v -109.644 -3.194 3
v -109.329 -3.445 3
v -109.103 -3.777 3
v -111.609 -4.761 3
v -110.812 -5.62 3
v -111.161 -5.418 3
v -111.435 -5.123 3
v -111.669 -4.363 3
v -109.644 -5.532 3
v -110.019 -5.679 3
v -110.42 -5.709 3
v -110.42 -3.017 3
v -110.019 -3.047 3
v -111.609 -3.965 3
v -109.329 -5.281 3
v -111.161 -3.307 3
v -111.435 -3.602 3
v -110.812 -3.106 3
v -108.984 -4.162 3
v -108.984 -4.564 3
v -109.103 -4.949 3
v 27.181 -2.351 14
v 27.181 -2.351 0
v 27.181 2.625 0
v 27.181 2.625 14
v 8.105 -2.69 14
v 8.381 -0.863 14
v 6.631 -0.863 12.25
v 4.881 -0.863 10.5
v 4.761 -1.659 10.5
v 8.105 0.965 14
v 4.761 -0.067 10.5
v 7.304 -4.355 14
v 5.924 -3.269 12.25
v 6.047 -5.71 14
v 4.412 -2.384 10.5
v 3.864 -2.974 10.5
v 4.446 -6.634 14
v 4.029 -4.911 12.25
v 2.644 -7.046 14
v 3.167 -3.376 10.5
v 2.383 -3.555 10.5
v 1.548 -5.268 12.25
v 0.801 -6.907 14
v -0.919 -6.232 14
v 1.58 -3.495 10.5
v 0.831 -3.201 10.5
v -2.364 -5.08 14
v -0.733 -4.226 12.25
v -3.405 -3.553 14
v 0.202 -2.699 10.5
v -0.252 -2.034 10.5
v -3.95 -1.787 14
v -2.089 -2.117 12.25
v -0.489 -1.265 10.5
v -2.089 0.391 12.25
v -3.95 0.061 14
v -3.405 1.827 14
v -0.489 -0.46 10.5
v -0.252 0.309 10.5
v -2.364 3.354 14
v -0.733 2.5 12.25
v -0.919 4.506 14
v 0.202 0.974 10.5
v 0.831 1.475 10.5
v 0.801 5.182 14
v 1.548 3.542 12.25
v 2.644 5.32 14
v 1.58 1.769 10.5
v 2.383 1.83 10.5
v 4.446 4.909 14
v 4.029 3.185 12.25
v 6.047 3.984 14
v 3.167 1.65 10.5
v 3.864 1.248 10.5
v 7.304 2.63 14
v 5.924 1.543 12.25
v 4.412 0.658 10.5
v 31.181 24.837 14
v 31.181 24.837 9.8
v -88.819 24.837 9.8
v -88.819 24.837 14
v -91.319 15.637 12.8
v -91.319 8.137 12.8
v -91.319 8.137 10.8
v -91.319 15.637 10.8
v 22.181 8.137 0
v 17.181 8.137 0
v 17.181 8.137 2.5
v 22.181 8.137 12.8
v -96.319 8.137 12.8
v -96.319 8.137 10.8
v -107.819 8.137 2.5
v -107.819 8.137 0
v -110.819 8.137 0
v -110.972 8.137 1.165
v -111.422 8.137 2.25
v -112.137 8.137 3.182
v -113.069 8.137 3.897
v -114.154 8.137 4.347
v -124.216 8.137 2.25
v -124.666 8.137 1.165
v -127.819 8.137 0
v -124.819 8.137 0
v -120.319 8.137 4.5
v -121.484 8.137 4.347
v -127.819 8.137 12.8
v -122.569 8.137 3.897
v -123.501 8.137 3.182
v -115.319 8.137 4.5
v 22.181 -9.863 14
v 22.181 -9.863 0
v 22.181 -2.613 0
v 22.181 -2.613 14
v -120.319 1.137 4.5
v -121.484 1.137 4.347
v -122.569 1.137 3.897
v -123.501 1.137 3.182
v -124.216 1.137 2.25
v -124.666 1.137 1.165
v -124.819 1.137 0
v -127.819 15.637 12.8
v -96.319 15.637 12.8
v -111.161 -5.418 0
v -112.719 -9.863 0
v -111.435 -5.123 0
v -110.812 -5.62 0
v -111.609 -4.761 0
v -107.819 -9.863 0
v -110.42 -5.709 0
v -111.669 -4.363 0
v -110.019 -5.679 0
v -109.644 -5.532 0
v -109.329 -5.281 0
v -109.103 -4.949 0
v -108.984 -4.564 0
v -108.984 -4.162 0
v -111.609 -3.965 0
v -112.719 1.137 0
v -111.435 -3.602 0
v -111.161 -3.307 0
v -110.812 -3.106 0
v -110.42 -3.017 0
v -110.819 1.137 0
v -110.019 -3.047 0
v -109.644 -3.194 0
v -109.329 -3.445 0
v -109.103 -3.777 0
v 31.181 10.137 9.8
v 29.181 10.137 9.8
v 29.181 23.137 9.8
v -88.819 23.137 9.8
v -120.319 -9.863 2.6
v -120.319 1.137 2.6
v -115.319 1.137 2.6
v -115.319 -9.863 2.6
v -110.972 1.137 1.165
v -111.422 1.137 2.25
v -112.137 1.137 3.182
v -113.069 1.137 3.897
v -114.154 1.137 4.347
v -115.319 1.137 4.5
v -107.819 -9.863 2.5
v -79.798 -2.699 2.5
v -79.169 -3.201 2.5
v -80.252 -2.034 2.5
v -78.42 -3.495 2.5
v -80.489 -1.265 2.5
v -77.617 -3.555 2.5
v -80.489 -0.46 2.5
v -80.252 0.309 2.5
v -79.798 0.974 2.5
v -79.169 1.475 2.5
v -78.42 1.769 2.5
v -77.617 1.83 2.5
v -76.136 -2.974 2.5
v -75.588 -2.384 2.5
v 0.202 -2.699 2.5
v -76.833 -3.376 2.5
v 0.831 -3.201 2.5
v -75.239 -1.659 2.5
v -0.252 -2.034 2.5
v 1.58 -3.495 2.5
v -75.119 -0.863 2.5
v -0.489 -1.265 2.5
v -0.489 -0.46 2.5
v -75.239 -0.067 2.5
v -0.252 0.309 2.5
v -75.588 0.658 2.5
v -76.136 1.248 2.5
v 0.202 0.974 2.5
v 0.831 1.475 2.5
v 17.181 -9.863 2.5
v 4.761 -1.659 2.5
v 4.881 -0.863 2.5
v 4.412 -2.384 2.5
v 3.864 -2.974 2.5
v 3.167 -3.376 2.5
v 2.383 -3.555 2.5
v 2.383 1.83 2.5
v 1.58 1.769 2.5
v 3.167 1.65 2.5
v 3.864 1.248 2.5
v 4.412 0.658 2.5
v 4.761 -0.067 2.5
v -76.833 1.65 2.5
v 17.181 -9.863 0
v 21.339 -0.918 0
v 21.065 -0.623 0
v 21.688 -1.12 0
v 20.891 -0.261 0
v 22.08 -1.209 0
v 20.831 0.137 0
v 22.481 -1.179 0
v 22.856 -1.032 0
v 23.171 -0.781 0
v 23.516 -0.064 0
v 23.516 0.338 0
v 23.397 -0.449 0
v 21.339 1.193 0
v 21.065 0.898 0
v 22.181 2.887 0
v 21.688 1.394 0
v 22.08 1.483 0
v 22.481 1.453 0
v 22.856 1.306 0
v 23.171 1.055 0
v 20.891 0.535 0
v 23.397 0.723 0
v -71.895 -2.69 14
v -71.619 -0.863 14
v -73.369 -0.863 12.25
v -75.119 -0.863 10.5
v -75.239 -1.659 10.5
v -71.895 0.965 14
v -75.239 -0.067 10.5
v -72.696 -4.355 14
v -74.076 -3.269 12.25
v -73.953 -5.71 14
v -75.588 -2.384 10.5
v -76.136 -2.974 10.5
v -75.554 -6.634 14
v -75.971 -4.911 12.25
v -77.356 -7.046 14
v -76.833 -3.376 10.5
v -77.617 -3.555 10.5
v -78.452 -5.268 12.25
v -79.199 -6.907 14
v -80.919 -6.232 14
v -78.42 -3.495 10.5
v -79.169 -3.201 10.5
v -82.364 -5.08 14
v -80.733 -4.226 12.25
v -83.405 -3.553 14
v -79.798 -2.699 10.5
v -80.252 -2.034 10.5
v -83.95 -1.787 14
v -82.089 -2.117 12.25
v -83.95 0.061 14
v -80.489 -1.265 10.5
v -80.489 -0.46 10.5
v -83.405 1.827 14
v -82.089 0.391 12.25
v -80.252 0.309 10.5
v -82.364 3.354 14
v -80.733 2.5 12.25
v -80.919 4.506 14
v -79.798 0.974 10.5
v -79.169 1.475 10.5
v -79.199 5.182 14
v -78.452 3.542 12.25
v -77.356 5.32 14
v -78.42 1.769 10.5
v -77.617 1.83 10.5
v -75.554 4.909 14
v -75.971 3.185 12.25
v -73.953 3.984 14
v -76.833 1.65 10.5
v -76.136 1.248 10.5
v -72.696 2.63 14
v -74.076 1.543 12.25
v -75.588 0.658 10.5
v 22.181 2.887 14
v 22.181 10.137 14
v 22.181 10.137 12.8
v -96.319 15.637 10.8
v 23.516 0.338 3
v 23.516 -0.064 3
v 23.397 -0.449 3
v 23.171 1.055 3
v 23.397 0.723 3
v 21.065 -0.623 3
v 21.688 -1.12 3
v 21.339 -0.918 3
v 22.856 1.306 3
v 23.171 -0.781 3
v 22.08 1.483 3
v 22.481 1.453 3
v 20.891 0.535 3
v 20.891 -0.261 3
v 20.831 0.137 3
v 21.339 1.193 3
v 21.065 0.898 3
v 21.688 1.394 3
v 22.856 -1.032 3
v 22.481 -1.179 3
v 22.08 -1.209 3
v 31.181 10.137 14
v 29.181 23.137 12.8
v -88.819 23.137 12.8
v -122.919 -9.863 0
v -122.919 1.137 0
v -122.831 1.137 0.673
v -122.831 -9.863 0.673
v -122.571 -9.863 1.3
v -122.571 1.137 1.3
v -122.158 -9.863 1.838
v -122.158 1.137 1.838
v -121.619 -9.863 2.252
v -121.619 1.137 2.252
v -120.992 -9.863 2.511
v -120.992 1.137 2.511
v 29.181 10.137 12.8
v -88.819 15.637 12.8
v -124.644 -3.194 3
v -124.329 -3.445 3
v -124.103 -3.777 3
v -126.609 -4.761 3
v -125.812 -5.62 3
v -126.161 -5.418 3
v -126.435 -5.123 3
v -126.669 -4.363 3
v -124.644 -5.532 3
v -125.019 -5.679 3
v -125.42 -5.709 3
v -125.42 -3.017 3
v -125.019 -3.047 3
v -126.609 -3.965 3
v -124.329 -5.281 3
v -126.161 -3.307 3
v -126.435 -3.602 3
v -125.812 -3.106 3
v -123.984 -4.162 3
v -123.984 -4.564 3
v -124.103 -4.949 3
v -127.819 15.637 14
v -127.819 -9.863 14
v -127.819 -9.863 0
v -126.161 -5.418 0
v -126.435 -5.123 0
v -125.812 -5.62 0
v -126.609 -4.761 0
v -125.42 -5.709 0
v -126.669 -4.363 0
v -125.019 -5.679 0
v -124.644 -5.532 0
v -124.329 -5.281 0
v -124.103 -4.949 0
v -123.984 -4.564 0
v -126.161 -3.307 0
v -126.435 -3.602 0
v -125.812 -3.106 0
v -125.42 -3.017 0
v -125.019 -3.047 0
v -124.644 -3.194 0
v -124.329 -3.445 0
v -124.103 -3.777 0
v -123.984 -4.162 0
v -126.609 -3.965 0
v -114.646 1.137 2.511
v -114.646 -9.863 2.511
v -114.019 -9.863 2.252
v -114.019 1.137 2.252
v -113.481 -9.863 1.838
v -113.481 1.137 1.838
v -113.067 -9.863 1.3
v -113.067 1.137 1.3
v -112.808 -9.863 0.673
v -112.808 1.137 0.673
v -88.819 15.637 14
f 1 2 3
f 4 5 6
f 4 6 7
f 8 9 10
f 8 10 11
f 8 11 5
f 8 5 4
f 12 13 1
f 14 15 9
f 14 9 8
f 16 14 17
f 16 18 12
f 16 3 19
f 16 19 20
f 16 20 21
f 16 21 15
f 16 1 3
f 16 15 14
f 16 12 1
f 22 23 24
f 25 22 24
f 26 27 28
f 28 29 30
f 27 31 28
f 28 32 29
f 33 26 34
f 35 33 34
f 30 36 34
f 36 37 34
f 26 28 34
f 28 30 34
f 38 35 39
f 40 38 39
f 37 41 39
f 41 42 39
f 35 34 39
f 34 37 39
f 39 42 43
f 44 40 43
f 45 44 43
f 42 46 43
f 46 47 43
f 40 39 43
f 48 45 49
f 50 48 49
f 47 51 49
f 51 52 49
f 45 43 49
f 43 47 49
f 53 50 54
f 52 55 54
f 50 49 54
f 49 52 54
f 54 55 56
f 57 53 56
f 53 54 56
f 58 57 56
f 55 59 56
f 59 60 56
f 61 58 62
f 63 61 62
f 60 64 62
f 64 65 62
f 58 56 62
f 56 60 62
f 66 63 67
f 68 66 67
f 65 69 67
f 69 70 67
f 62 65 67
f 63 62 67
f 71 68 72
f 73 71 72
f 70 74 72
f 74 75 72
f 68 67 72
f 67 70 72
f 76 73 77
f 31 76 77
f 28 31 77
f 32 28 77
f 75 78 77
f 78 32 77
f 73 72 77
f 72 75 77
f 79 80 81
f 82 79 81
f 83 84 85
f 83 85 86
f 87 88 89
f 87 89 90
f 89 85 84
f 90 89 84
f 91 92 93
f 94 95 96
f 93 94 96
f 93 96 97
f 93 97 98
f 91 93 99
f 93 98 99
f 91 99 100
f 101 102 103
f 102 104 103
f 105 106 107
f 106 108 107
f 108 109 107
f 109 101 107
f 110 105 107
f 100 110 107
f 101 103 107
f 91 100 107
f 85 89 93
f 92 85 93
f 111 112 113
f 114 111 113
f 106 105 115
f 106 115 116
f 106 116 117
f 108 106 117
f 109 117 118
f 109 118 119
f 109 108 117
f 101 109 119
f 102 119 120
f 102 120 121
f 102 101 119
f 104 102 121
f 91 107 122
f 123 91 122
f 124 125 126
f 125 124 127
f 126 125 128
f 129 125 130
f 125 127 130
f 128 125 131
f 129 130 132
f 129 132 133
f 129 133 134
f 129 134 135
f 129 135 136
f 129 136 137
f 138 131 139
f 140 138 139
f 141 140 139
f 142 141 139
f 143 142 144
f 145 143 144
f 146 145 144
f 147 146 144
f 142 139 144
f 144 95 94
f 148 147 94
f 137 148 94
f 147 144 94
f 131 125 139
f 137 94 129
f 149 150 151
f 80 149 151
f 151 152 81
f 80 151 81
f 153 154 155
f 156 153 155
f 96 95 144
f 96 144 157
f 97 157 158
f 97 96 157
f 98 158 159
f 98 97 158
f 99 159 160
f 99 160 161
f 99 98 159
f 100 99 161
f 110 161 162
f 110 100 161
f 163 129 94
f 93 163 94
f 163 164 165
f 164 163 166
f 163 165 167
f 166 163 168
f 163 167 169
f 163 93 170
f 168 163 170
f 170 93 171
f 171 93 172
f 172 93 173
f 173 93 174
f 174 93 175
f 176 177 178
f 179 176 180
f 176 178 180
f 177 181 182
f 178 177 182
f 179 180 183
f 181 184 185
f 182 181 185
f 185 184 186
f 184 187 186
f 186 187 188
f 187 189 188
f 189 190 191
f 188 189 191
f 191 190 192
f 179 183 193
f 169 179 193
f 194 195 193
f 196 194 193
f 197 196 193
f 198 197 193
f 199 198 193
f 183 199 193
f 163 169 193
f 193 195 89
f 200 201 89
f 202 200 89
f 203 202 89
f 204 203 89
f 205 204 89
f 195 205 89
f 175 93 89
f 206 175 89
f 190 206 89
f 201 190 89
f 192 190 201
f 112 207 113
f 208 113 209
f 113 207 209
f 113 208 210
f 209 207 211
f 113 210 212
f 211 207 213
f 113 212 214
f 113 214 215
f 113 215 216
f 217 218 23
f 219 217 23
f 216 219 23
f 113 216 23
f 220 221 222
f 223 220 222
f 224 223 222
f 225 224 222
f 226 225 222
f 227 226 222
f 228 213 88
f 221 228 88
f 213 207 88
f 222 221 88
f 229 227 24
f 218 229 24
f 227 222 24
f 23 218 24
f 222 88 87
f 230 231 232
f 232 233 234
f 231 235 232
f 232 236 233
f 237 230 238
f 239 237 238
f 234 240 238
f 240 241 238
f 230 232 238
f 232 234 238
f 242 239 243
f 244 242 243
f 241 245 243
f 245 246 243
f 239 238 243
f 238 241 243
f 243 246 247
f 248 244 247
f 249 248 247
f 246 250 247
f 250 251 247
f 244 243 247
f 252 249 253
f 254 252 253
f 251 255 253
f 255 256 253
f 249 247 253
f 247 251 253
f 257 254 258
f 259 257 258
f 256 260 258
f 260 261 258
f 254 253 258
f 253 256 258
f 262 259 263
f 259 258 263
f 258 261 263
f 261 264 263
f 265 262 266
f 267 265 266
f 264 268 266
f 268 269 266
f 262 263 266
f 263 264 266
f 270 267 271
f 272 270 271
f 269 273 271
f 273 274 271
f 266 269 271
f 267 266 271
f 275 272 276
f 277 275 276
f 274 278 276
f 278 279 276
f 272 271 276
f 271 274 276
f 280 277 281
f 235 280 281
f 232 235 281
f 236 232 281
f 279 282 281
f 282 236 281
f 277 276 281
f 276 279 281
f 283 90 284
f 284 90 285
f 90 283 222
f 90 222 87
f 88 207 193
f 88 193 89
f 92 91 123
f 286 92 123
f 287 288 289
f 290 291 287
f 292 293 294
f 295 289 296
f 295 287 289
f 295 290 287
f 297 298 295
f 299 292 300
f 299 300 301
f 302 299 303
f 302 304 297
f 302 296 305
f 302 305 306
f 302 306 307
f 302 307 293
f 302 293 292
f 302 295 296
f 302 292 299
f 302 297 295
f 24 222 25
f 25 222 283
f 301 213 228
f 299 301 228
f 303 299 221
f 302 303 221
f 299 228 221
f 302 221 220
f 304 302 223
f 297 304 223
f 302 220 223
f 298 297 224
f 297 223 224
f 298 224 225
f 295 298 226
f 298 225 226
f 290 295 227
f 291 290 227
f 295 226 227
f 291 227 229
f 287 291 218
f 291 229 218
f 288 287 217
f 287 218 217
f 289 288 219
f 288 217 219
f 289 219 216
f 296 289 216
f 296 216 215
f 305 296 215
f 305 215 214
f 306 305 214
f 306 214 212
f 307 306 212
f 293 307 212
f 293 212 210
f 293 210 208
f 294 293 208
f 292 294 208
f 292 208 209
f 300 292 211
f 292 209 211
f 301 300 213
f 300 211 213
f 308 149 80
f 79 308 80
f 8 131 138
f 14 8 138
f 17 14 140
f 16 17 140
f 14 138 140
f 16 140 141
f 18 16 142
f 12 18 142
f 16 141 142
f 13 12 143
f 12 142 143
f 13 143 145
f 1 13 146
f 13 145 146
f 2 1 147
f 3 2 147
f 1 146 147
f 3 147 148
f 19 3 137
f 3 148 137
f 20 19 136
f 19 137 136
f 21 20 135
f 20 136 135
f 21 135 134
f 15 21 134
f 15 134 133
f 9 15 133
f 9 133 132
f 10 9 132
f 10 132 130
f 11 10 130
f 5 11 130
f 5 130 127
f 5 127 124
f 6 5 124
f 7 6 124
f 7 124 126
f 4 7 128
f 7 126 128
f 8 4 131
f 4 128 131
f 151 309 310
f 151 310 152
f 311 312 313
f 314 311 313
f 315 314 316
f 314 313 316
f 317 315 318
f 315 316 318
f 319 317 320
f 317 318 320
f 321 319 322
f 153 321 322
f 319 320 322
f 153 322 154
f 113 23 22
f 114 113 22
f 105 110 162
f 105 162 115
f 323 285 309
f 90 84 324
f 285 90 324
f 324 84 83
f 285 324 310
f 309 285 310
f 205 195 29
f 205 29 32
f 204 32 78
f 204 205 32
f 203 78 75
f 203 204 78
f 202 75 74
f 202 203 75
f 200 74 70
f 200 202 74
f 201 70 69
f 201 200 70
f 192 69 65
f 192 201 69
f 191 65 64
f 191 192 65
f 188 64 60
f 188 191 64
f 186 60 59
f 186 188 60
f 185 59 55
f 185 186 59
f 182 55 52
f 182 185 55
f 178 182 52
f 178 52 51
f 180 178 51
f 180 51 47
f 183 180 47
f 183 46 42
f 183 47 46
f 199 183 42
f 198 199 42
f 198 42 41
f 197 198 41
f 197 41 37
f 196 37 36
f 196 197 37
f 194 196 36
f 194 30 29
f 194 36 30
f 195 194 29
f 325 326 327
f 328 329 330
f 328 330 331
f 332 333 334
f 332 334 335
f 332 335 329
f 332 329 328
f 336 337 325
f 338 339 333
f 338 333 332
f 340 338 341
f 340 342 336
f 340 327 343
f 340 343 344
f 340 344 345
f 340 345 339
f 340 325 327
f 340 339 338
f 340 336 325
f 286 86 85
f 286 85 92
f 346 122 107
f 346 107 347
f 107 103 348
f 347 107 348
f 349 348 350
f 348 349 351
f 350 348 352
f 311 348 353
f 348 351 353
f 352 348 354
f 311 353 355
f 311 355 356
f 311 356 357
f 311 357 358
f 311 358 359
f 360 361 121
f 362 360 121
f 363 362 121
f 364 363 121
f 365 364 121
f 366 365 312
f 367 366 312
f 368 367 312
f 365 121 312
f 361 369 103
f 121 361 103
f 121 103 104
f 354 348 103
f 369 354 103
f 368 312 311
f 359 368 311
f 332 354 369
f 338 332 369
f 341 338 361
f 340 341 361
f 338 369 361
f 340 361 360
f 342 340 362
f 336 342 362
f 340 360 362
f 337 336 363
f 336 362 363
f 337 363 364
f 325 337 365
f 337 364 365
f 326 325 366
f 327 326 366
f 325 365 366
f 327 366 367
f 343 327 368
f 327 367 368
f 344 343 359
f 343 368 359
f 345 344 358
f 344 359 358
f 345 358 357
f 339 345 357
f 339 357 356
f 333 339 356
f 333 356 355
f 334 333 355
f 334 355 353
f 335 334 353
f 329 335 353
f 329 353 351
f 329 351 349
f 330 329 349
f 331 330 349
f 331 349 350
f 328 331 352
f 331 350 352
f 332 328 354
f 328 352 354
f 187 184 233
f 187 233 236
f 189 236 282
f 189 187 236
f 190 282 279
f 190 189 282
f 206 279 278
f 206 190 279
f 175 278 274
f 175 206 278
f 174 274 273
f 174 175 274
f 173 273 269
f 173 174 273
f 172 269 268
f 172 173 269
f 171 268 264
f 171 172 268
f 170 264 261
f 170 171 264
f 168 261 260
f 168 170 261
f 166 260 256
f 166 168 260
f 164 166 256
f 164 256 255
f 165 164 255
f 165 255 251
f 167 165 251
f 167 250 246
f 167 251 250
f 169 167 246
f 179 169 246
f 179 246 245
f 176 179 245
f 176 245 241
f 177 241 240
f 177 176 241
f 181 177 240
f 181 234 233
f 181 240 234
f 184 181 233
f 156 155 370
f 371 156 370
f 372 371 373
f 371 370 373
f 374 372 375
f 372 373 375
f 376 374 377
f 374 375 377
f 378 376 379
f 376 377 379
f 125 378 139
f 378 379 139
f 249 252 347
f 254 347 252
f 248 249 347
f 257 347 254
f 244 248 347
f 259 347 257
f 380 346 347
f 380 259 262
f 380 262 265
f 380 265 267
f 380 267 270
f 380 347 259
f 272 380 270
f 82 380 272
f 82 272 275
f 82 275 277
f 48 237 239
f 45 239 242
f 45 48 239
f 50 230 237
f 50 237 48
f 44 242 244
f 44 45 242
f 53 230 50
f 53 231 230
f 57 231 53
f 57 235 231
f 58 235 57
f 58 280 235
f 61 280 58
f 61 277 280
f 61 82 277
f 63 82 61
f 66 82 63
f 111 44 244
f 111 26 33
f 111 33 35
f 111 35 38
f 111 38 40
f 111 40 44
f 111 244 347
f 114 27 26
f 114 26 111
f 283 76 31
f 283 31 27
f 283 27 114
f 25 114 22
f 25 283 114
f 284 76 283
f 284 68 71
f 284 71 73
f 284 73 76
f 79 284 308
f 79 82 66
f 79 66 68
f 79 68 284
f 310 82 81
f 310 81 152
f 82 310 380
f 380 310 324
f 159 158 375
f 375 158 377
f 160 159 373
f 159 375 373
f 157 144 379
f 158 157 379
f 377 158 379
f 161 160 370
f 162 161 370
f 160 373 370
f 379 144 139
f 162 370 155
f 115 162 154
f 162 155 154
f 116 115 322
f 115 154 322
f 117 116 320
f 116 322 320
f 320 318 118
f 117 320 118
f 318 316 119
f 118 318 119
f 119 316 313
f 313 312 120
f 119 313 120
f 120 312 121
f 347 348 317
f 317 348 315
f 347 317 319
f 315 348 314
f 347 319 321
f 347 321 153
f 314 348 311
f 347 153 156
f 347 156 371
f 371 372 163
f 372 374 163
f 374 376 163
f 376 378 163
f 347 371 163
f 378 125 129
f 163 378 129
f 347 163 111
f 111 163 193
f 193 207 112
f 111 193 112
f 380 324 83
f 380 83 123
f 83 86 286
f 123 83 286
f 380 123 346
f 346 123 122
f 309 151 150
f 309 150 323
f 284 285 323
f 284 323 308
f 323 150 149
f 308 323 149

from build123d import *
from OCP.BRepFilletAPI import BRepFilletAPI_MakeChamfer

# Parameters (mm, degrees)
BOSS_EXTRUDE1_DEPTH      = 14
BOSS_EXTRUDE1_DEPTH_BACK = 14
CUT_EXTRUDE1_DEPTH       = 157
CUT_EXTRUDE4_DEPTH       = 2.5
CUT_EXTRUDE4_DEPTH_BACK  = 2.5
SKETCH8_W                = 125
SKETCH8_H                = 34.7
CUT_EXTRUDE5_DEPTH       = 131.960317585
CUT_EXTRUDE5_DEPTH_BACK  = 131.960317585
SKETCH9_R                = 2.7
CHAMFER2_SIZE            = 5
CHAMFER2_SIZE_2          = 0.262038896
CUT_EXTRUDE8_DEPTH       = 7
CUT_EXTRUDE9_DEPTH       = 131.749429849
SKETCH16_W               = 214.344642296
SKETCH16_H               = 84.645654919
CUT_EXTRUDE10_DEPTH      = 131.960317585
SKETCH17_W               = 2
SKETCH17_H               = 14.7
CUT_EXTRUDE11_DEPTH      = 9.8
SKETCH18_R               = 1.35
CUT_EXTRUDE12_DEPTH      = 3
CHAMFER7_SIZE            = 3.5
SKETCH19_W               = 5
SKETCH19_H               = 7.5
BOSS_EXTRUDE2_DEPTH      = 2


with BuildPart() as part:
    # Sketch1 → Boss-Extrude1 (new, two sides: drawn at the far end of the back side and taken through both)
    with BuildSketch(Plane.XY.offset(-BOSS_EXTRUDE1_DEPTH_BACK)):
        Polygon((-127.819104229, -9.862903226), (22.180895771, -9.862903226), (22.180895771, -2.612903226), (27.180895771, -2.612903226), (27.180895771, 2.887096774), (22.180895771, 2.887096774), (22.180895771, 10.137096774), (31.180895771, 10.137096774), (31.180895771, 23.637096774), (31.180895771, 24.837096774), (-88.819104229, 24.837096774), (-88.819104229, 23.637096774), (-88.819104229, 15.637096774), (-127.819104229, 15.637096774), align=None)
    extrude(amount=BOSS_EXTRUDE1_DEPTH + BOSS_EXTRUDE1_DEPTH_BACK)

    # Sketch2 → Cut-Extrude1 (cut)
    with BuildSketch(Plane.ZY.offset(127.819104229)):
        Polygon((-12.8, 23.137096774), (-12.8, 8.137096774), (12.8, 8.137096774), (12.8, 23.137096774), (9.8, 23.137096774), (9.8, 24.837096774), (-9.8, 24.837096774), (-9.8, 23.137096774), align=None)
    extrude(amount=-CUT_EXTRUDE1_DEPTH, mode=Mode.SUBTRACT)

    # Sketch8 → Cut-Extrude4 (cut, two sides: drawn at the far end of the back side and taken through both)
    with BuildSketch(Plane.XY.offset(-CUT_EXTRUDE4_DEPTH_BACK)):
        with Locations((-45.319104229, 7.487096774)):
            Rectangle(SKETCH8_W, SKETCH8_H)
    extrude(amount=CUT_EXTRUDE4_DEPTH + CUT_EXTRUDE4_DEPTH_BACK, mode=Mode.SUBTRACT)

    # Sketch9 → Cut-Extrude5 (cut, two sides: drawn at the far end of the back side and taken through both)
    with BuildSketch(Plane.XY.offset(-CUT_EXTRUDE5_DEPTH_BACK)):
        with Locations((-77.819104229, -0.862903226)):
            Circle(SKETCH9_R)
        with Locations((2.180895771, -0.862903226)):
            Circle(SKETCH9_R)
    extrude(amount=CUT_EXTRUDE5_DEPTH + CUT_EXTRUDE5_DEPTH_BACK, mode=Mode.SUBTRACT)

    # Chamfer2
    chamfer2_edges_1 = [part.edges().sort_by_distance(p)[0] for p in [
        (27.180895771, -2.612903226, 0),
    ]]
    chamfer2_side_1 = [part.faces().sort_by_distance(p)[0] for p in [
        (27.175654993, -2.612903226, 0),
    ]]
    chamfer2_edges_2 = [part.edges().sort_by_distance(p)[0] for p in [
        (27.180895771, 2.887096774, 0),
    ]]
    chamfer2_side_2 = [part.faces().sort_by_distance(p)[0] for p in [
        (27.180895771, 2.881855996, 0),
    ]]
    chamfer2 = BRepFilletAPI_MakeChamfer(part.part.solid().wrapped)
    for e in chamfer2_edges_1:
        chamfer2.Add(CHAMFER2_SIZE - 0.0001, CHAMFER2_SIZE_2 - 0.0001, e.wrapped, chamfer2_side_1[0].wrapped)
    for e in chamfer2_edges_2:
        chamfer2.Add(CHAMFER2_SIZE_2 - 0.0001, CHAMFER2_SIZE - 0.0001, e.wrapped, chamfer2_side_2[0].wrapped)
    add(Compound.cast(chamfer2.Shape()), mode=Mode.REPLACE)  # a hair under: the kernel refuses the full size

    # Sketch14 → Cut-Extrude8 (cut)
    with BuildSketch(Plane(origin=(0, 8.137096774, 0), x_dir=(1, 0, 0), z_dir=(0, 1, 0))):
        with BuildLine():
            Line((-120.319104229, 4.5), (-115.319104229, 4.5))
            ThreePointArc((-115.319104229, 4.5), (-110.819104229, 0), (-115.319104229, -4.5))
            Line((-115.319104229, -4.5), (-120.319104229, -4.5))
            ThreePointArc((-120.319104229, -4.5), (-124.819104229, 0), (-120.319104229, 4.5))
        make_face()
    extrude(amount=-CUT_EXTRUDE8_DEPTH, mode=Mode.SUBTRACT)

    # Sketch15 → Cut-Extrude9 (cut, through all)
    with BuildSketch(Plane(origin=(0, 1.137096774, 0), x_dir=(1, 0, 0), z_dir=(0, 1, 0))):
        with BuildLine():
            Line((-120.319104229, -2.6), (-115.319104229, -2.6))
            ThreePointArc((-115.319104229, -2.6), (-112.719104229, 0), (-115.319104229, 2.6))
            Line((-115.319104229, 2.6), (-120.319104229, 2.6))
            ThreePointArc((-120.319104229, 2.6), (-122.919104229, 0), (-120.319104229, -2.6))
        make_face()
    extrude(amount=-CUT_EXTRUDE9_DEPTH, mode=Mode.SUBTRACT)

    # Sketch16 → Cut-Extrude10 (cut, through all)
    with BuildSketch(Plane.XY):
        with Locations((-30.272765953, 16.776086779)):
            Rectangle(SKETCH16_W, SKETCH16_H)
    extrude(amount=-CUT_EXTRUDE10_DEPTH, mode=Mode.SUBTRACT)

    # Sketch17 → Cut-Extrude11 (cut)
    with BuildSketch(Plane(origin=(0, 0, 0), x_dir=(-1, 0, 0), z_dir=(0, 0, -1))):
        with Locations((-30.180895771, 17.487096774)):
            Rectangle(SKETCH17_W, SKETCH17_H)
    extrude(amount=-CUT_EXTRUDE11_DEPTH, mode=Mode.SUBTRACT)

    # Sketch18 → Cut-Extrude12 (cut)
    with BuildSketch(Plane(origin=(0, 0, 0), x_dir=(-1, 0, 0), z_dir=(0, 0, -1))):
        with Locations((110.319104229, -4.362903226)):
            Circle(SKETCH18_R)
        with Locations((125.319104229, -4.362903226)):
            Circle(SKETCH18_R)
        with Locations((-22.180895771, 0.137096774)):
            Circle(SKETCH18_R)
    extrude(amount=-CUT_EXTRUDE12_DEPTH, mode=Mode.SUBTRACT)

    # Chamfer7
    chamfer7_edges = [part.edges().sort_by_distance(p)[0] for p in [
        (-80.519104229, -0.862903226, 14),
        (-0.519104229, -0.862903226, 14),
    ]]
    chamfer(chamfer7_edges, length=CHAMFER7_SIZE)

    # Sketch19 → Boss-Extrude2 (add)
    with BuildSketch(Plane(origin=(0, 0, 12.8), x_dir=(-1, 0, 0), z_dir=(0, 0, -1))):
        with Locations((93.819104229, 11.887096774)):
            Rectangle(SKETCH19_W, SKETCH19_H)
    extrude(amount=BOSS_EXTRUDE2_DEPTH)


solid = part.part
